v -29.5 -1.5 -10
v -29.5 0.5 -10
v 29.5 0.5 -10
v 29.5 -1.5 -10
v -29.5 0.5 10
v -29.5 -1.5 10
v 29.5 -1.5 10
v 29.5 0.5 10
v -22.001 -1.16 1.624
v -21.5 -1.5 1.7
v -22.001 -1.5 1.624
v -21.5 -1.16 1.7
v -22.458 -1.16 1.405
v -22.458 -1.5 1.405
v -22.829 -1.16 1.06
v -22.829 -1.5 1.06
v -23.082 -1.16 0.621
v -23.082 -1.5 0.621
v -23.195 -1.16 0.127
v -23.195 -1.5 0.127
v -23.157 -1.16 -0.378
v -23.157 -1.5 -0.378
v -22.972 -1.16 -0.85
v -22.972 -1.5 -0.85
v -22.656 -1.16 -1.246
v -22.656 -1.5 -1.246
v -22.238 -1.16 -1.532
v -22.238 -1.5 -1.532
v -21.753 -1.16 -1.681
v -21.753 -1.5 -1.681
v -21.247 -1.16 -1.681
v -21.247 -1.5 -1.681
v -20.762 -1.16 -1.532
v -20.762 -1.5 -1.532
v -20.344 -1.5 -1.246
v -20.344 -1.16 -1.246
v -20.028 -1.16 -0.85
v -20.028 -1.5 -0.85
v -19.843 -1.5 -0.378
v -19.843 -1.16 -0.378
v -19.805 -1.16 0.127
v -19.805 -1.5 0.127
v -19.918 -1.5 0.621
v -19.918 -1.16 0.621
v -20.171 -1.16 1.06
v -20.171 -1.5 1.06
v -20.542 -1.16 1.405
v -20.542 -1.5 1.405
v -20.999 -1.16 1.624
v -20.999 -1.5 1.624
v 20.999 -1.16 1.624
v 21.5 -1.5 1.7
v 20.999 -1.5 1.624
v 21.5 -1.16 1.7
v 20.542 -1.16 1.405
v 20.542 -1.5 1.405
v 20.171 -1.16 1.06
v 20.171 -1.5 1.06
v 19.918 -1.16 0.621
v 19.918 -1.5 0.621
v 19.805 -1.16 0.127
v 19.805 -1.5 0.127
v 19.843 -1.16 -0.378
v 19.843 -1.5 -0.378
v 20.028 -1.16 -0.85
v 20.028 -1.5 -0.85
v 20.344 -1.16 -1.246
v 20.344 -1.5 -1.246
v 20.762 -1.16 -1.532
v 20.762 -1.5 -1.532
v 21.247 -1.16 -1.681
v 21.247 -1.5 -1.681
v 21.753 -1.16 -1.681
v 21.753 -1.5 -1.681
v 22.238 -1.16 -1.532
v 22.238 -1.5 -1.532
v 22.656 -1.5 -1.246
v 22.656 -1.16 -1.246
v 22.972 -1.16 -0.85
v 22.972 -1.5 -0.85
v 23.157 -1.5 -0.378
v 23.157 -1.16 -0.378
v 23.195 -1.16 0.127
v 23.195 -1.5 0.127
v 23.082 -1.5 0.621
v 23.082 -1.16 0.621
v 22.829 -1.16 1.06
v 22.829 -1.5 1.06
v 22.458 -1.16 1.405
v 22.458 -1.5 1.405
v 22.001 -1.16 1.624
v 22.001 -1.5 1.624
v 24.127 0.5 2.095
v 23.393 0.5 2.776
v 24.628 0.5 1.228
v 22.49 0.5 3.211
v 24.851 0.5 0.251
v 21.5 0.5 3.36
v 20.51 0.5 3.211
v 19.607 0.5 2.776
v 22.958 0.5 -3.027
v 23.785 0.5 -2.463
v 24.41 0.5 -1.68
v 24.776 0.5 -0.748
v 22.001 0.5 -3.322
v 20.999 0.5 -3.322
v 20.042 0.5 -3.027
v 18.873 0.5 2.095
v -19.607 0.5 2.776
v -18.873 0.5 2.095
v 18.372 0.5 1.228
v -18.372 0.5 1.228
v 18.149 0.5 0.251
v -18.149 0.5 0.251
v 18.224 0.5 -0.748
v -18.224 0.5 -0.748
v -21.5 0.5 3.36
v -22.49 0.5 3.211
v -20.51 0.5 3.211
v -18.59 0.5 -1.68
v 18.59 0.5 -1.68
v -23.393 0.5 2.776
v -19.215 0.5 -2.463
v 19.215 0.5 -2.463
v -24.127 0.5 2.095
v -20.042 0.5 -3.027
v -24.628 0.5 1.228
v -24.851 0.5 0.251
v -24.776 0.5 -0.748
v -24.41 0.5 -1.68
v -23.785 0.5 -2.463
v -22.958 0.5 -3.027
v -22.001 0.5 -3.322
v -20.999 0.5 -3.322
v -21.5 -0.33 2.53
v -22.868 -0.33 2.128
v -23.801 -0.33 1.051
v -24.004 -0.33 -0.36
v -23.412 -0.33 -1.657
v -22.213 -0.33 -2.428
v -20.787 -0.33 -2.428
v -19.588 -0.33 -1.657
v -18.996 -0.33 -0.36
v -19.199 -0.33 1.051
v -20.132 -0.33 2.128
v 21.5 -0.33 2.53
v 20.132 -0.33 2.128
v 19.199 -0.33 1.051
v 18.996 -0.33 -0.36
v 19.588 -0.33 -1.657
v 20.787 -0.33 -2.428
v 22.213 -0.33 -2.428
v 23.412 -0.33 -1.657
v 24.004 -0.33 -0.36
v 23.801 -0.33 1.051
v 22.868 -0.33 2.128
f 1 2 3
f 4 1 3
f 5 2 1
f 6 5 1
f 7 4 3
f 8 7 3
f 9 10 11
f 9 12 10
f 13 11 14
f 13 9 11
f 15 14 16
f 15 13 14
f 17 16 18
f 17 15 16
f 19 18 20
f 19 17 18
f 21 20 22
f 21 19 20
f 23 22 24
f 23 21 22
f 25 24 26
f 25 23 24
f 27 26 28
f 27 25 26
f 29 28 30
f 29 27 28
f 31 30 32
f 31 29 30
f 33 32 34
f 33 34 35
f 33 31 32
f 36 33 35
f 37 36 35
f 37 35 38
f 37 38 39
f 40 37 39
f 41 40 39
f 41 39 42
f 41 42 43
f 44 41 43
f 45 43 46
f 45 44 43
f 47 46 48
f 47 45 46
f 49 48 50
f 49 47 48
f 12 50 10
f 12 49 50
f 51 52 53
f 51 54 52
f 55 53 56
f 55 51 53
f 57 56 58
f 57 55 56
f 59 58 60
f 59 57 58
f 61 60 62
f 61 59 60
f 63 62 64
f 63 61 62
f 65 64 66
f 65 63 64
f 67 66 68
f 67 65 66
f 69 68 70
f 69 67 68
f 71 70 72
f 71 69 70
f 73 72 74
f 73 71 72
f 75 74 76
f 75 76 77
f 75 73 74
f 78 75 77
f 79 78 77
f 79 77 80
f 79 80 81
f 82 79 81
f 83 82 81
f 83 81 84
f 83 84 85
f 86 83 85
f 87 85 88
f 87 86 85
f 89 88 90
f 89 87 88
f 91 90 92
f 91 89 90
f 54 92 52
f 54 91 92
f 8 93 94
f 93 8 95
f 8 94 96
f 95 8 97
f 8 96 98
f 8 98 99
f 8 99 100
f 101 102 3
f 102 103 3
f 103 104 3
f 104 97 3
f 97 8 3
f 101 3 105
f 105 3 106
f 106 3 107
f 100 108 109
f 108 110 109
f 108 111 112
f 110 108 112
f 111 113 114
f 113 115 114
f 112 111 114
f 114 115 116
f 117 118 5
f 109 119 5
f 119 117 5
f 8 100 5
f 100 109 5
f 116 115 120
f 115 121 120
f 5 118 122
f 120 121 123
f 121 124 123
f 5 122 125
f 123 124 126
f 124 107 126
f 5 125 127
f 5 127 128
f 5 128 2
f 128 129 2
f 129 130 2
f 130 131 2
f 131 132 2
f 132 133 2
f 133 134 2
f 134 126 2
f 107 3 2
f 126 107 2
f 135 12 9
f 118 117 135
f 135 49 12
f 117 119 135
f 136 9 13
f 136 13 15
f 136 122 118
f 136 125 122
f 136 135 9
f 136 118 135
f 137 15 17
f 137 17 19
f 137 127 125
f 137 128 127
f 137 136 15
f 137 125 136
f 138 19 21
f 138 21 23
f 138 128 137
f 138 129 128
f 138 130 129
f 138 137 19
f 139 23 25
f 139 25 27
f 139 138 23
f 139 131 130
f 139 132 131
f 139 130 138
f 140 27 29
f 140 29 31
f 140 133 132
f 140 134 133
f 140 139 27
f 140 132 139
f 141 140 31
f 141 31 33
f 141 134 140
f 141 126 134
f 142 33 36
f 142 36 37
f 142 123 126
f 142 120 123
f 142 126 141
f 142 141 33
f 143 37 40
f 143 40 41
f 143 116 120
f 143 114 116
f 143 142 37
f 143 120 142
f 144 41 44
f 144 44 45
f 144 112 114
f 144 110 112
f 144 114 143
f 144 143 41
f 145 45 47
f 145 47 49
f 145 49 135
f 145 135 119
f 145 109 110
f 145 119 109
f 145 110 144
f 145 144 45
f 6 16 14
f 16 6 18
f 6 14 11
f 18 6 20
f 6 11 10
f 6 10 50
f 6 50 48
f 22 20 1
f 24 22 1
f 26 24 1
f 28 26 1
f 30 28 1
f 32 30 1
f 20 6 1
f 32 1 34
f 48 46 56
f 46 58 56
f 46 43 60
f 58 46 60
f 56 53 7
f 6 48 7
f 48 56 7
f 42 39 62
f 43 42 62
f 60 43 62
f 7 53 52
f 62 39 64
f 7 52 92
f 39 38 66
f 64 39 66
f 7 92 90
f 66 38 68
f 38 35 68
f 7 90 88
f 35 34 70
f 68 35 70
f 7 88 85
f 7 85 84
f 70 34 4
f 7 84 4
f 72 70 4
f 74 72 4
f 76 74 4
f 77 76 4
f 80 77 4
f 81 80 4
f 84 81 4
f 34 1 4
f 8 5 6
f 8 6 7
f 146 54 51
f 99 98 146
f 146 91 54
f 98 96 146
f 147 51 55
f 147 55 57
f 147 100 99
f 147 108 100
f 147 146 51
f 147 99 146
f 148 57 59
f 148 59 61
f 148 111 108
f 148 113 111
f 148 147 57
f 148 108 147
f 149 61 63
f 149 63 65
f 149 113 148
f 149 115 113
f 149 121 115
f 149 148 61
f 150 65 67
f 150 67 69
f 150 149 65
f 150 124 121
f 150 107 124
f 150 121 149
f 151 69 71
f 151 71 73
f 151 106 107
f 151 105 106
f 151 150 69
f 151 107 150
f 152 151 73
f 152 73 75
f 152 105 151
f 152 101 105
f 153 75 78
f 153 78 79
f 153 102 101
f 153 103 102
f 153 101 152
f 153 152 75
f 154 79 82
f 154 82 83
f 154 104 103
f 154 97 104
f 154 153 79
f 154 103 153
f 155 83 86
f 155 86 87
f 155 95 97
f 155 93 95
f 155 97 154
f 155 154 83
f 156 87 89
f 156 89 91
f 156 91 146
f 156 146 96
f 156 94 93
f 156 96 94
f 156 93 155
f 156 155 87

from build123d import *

# Parameters (mm, degrees)
EXTRUDE_765_DEPTH           = 10
EXTRUDE_765_DEPTH_BACK      = 10
HOLE_WIZARD_M3_2_AT_2_COUNT = 2
HOLE_WIZARD_M3_2_AT_2_PITCH = 43


with BuildPart() as part:
    # Sketch 1 → Extrude 765 (new, two sides: drawn at the far end of the back side and taken through both)
    with BuildSketch(Plane.XY.offset(-EXTRUDE_765_DEPTH_BACK)):
        Polygon((29.5, 0.5), (-29.5, 0.5), (-29.5, -1.5), (-13.5, -1.5), (13.5, -1.5), (29.5, -1.5), align=None)
        Polygon((29.5, 0.5), (-29.5, 0.5), (-29.5, -1.5), (-13.5, -1.5), (13.5, -1.5), (29.5, -1.5), align=None)
        Polygon((29.5, 0.5), (-29.5, 0.5), (-29.5, -1.5), (-13.5, -1.5), (13.5, -1.5), (29.5, -1.5), align=None)
        Polygon((29.5, 0.5), (-29.5, 0.5), (-29.5, -1.5), (-13.5, -1.5), (13.5, -1.5), (29.5, -1.5), align=None)
    extrude(amount=EXTRUDE_765_DEPTH + EXTRUDE_765_DEPTH_BACK)

    # 草图9 → M3*2 沉头孔 (revolve, cut)
    with BuildSketch(Plane(origin=(-21.5, 0.5, 0), x_dir=(0, 0, 1), z_dir=(1, 0, 0))):
        Polygon((0, 0), (0, 2), (1.7, 2), (1.7, 1.66), (3.36, 0), align=None)
    hole_wizard_m3_2 = revolve(axis=Axis((-21.5, 6.85, 0), (0, -1, 0)), mode=Mode.SUBTRACT)

    # M3*2 沉头孔 at 2: M3*2 沉头孔 ×2
    with Locations(*[(i * HOLE_WIZARD_M3_2_AT_2_PITCH, 0, 0) for i in range(1, HOLE_WIZARD_M3_2_AT_2_COUNT)]):
        add(hole_wizard_m3_2, mode=Mode.SUBTRACT)


solid = part.part
